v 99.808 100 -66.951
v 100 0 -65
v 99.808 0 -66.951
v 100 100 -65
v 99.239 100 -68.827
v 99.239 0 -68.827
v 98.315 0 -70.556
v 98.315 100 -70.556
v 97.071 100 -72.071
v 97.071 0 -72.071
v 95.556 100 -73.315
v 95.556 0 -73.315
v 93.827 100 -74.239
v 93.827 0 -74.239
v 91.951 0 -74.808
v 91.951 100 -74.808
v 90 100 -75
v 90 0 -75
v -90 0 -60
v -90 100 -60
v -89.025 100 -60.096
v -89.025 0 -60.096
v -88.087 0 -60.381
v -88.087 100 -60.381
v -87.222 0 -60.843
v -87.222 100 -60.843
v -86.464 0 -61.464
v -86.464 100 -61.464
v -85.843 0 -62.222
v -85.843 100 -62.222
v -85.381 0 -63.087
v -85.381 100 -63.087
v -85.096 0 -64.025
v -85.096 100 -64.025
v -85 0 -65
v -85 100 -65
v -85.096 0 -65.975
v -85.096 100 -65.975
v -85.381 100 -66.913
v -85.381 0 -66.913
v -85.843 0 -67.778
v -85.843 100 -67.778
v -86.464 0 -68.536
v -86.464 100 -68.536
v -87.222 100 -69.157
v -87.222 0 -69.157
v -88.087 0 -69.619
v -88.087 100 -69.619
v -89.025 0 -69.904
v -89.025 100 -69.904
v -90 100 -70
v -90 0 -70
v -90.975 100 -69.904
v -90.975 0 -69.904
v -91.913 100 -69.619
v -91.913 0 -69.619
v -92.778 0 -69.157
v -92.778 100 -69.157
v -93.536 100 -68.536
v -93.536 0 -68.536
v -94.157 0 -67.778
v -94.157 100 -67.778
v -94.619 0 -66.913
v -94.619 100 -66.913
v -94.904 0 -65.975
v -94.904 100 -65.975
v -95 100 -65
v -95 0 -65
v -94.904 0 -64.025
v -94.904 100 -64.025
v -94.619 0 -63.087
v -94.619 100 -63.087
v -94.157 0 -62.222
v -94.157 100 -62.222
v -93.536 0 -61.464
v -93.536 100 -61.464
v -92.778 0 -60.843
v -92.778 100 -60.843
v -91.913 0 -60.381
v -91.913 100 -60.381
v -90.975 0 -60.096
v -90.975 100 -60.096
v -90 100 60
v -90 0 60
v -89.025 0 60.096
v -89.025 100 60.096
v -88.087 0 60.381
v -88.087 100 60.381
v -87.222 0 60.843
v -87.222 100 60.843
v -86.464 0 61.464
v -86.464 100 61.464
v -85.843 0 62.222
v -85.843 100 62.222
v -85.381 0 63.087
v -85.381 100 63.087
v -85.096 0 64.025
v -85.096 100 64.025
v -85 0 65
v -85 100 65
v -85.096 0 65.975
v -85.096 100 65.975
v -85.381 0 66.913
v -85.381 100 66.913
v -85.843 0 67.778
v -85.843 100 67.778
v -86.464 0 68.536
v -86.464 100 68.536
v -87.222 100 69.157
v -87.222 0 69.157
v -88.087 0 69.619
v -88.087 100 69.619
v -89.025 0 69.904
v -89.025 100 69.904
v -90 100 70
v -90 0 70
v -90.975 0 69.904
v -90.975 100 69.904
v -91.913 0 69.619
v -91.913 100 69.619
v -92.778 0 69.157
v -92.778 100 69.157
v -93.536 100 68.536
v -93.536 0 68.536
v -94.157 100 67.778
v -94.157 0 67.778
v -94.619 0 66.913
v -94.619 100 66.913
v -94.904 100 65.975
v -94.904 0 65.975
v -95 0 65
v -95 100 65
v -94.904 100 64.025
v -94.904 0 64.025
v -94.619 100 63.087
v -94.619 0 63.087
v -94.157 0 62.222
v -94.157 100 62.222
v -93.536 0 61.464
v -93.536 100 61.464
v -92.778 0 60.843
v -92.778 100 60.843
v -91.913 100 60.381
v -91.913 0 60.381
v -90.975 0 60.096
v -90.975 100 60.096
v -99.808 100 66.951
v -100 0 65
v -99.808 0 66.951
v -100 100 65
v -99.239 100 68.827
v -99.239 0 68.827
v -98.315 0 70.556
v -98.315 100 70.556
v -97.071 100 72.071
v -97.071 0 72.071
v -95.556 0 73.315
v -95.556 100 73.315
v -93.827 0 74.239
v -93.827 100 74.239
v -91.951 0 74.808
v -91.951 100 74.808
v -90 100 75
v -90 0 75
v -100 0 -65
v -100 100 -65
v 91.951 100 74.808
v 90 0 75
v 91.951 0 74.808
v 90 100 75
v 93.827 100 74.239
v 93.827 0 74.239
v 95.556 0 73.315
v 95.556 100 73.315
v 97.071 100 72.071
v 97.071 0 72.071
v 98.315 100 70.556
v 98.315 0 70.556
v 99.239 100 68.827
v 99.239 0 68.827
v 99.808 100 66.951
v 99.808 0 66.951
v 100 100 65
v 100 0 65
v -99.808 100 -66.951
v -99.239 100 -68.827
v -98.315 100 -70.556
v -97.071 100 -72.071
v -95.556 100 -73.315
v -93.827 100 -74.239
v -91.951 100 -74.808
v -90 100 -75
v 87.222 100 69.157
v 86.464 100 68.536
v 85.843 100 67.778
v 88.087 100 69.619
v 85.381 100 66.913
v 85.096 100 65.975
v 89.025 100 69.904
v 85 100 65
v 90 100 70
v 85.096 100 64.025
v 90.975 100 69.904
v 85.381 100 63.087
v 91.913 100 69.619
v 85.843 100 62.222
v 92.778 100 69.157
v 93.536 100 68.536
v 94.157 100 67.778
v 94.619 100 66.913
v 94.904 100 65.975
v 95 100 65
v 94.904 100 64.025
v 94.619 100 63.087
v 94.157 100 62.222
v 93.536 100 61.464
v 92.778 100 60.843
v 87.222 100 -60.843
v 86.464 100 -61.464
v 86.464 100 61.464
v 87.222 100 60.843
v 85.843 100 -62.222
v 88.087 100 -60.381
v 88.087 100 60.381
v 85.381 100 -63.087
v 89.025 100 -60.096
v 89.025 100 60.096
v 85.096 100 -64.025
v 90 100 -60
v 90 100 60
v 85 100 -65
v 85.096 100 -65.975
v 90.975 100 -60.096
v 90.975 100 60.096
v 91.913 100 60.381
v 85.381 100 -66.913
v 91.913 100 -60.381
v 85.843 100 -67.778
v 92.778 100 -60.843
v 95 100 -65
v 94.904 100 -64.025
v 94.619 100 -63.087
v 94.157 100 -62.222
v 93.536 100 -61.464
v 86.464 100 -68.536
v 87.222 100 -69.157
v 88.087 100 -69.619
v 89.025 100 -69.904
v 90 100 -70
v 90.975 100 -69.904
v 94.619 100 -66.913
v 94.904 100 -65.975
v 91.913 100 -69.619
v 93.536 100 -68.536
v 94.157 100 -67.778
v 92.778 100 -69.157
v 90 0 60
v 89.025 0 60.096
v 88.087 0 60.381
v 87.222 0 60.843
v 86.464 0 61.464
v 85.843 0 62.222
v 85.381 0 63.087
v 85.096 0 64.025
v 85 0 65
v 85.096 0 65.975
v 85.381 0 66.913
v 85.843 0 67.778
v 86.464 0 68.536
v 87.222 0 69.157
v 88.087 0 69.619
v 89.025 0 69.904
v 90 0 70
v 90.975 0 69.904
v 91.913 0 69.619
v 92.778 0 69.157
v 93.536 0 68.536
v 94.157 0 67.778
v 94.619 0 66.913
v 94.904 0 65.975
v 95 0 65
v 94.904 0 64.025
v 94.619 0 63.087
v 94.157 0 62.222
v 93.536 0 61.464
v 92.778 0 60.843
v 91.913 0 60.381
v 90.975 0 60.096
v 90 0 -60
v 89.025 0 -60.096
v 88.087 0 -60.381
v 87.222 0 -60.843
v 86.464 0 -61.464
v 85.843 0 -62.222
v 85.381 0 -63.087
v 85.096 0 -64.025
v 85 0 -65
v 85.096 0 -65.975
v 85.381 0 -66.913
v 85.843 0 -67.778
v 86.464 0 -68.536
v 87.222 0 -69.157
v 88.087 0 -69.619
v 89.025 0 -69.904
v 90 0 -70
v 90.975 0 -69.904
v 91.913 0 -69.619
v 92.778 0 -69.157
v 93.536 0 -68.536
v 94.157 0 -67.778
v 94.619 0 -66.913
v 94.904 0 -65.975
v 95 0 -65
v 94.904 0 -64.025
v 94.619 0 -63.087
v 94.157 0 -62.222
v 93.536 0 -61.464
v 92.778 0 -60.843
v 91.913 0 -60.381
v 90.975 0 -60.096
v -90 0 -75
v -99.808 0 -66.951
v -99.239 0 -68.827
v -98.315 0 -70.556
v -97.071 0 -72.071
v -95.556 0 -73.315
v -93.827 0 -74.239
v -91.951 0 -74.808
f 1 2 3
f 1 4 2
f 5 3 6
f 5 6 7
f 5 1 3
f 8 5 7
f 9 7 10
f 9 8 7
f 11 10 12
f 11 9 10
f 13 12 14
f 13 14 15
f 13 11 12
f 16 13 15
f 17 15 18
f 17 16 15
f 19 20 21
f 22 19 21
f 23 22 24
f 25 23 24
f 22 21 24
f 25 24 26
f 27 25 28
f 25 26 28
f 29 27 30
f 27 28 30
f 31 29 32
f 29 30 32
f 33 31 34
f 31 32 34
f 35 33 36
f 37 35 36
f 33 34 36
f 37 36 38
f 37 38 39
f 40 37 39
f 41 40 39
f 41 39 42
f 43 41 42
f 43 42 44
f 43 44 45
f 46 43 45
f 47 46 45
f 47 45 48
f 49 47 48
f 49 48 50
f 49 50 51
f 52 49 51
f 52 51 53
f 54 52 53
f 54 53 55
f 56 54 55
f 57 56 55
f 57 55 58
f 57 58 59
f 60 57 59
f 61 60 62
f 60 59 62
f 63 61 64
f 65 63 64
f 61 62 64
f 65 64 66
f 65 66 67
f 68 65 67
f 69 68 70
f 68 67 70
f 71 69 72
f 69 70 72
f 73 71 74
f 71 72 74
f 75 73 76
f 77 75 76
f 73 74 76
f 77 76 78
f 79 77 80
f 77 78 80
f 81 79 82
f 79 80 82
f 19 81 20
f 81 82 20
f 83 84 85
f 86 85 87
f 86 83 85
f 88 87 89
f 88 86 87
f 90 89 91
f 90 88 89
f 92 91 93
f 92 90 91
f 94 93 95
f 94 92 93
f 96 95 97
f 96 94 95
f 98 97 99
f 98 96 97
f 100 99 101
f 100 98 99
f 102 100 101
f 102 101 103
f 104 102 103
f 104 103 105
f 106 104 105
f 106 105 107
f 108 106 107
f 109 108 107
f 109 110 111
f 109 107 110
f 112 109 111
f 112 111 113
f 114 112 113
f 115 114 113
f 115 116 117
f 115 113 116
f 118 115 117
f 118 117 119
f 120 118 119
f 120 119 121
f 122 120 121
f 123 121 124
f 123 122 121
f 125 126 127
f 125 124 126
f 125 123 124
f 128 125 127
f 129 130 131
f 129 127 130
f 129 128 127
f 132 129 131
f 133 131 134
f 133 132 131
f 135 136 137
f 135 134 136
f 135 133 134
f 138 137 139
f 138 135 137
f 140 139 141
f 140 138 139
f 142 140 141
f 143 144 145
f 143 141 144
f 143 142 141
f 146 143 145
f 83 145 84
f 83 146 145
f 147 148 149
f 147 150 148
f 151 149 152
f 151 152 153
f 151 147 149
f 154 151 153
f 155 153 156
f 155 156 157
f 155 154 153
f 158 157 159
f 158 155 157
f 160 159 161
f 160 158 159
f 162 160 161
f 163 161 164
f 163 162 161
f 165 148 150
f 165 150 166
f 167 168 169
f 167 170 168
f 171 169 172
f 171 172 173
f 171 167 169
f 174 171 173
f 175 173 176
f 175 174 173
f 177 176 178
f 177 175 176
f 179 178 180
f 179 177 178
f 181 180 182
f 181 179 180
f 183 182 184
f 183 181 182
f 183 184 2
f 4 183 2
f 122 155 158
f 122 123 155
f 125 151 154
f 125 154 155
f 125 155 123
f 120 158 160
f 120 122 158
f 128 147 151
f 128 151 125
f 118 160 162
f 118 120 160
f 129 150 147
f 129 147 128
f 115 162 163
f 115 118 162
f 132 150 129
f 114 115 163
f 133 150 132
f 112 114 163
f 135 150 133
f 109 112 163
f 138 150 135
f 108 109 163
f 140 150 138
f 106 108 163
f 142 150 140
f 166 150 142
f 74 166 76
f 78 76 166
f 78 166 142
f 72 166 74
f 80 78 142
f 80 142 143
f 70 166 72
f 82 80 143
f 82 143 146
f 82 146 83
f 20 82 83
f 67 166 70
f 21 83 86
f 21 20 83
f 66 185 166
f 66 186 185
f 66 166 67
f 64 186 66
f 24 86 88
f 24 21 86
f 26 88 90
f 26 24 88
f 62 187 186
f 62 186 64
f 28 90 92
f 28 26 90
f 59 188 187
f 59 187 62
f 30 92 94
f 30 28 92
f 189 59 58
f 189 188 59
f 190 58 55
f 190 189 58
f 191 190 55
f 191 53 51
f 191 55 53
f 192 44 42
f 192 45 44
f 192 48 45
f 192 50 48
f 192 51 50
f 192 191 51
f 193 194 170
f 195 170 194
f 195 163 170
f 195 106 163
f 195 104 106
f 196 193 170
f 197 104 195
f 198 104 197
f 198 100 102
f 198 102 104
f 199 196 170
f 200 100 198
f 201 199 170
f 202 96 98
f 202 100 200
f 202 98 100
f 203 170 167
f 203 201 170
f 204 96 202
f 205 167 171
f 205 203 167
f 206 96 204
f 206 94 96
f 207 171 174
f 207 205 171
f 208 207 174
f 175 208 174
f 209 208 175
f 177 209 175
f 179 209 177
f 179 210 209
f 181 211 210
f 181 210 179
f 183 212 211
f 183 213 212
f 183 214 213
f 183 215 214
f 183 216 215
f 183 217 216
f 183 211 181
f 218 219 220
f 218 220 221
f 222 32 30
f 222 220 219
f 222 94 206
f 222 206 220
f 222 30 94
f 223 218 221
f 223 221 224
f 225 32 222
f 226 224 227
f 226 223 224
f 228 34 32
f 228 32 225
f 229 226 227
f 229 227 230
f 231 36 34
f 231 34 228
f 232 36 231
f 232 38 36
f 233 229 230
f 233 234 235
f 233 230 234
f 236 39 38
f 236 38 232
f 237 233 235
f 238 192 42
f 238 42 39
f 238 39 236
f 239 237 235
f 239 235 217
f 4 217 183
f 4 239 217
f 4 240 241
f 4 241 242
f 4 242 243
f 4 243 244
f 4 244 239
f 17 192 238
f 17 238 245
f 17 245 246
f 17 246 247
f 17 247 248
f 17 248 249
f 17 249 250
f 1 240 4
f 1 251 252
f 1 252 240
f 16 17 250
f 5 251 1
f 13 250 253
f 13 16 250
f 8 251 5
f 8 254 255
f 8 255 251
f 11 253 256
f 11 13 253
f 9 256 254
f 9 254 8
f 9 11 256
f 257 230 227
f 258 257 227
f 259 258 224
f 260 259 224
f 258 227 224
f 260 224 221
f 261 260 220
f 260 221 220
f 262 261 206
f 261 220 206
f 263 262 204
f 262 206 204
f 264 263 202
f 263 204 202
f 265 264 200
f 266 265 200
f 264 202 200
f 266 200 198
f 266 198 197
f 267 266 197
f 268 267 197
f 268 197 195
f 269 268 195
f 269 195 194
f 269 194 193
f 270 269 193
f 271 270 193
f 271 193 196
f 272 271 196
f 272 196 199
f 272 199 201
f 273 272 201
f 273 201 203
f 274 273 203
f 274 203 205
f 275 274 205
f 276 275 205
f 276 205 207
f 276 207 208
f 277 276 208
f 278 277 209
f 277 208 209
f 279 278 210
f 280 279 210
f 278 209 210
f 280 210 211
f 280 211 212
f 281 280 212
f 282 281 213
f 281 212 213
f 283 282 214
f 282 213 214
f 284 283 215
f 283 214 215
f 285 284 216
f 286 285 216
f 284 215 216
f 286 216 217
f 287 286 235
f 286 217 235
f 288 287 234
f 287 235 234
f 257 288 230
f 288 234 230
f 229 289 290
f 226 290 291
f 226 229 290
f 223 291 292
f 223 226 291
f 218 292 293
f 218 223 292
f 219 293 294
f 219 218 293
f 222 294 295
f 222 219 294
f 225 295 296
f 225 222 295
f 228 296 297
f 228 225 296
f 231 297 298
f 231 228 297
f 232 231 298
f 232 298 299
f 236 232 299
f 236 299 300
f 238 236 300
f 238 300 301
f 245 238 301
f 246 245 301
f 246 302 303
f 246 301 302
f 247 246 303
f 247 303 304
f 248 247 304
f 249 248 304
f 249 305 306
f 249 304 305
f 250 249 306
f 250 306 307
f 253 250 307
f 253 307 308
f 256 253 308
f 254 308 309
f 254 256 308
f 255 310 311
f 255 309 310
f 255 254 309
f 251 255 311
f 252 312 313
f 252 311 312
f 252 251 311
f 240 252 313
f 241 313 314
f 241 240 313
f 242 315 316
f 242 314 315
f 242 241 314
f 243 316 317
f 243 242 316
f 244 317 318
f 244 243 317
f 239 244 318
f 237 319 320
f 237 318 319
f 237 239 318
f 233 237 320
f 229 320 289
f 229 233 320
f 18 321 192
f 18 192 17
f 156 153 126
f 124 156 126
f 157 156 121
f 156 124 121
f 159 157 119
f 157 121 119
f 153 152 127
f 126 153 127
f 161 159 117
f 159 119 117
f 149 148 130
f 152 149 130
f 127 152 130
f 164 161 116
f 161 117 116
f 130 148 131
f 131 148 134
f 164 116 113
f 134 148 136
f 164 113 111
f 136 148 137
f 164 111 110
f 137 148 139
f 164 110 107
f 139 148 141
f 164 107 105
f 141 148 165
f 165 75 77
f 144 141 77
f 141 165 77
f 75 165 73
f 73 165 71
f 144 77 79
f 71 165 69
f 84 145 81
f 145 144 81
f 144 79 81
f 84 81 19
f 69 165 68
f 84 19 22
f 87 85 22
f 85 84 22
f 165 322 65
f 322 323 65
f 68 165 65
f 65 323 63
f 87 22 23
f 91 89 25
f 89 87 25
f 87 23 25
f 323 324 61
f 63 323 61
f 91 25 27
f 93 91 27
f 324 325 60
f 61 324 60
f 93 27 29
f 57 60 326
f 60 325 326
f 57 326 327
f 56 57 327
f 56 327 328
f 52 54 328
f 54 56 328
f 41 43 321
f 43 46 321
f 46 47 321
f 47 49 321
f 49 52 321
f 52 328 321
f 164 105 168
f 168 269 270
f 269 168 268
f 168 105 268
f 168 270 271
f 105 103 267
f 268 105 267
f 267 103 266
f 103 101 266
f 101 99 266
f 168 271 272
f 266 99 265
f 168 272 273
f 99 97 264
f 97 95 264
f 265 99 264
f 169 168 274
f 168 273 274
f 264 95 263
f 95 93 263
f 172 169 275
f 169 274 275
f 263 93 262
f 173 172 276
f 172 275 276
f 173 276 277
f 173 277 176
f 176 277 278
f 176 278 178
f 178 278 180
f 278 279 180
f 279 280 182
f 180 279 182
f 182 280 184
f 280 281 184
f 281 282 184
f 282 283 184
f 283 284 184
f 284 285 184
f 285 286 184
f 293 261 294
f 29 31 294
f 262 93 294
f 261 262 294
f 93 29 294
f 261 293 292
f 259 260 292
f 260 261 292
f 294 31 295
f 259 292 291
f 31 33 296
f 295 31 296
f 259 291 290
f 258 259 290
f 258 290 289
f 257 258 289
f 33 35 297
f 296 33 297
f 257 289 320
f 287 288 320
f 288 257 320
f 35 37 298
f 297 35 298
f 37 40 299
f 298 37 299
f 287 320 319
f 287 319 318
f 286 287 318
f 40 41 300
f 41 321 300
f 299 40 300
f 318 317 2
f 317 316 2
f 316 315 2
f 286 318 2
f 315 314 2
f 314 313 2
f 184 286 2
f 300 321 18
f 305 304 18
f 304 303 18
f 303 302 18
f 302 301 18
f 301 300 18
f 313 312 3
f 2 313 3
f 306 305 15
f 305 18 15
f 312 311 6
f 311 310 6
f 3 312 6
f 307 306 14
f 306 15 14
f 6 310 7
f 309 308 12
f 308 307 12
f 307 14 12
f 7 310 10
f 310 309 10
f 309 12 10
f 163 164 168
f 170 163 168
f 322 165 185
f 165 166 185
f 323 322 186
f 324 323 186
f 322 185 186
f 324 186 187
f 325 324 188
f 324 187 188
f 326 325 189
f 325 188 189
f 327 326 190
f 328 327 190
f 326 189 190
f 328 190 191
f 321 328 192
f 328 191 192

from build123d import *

# Parameters (mm, degrees)
CROQUIS1_W                                 = 200
CROQUIS1_H                                 = 150
SALIENTE_EXTRUIR1_DEPTH                    = 100
REDONDEO1_R                                = 10
CROQUIS2_R                                 = 5
CORTAR_EXTRUIR1_DEPTH                      = 161.078105936
SIMETR_A1_AT_THE_SECOND_PLANE_COPY_1_SKE_R = 5
SIMETR_A1_AT_THE_SECOND_PLANE_COPY_1_DEPTH = 161.078105936


with BuildPart() as part:
    # Croquis1 → Saliente-Extruir1 (new body)
    with BuildSketch(Plane(origin=(0, 0, 0), x_dir=(1, 0, 0), z_dir=(0, 1, 0))):
        Rectangle(CROQUIS1_W, CROQUIS1_H)
    extrude(amount=SALIENTE_EXTRUIR1_DEPTH)

    # Redondeo1
    redondeo1_edges = [part.edges().sort_by_distance(p)[0] for p in [
        (-100, 50, -75),
        (100, 50, -75),
        (100, 50, 75),
        (-100, 50, 75),
    ]]
    fillet(redondeo1_edges, radius=REDONDEO1_R)

    # Croquis2 → Cortar-Extruir1 (cut, through all)
    with BuildSketch(Plane(origin=(0, 100, 0), x_dir=(1, 0, 0), z_dir=(0, 1, 0))):
        with Locations(Location((-90, 65, 0), (0, 0, 270))):
            Circle(CROQUIS2_R)
    cortar_extruir1 = extrude(amount=-CORTAR_EXTRUIR1_DEPTH, mode=Mode.SUBTRACT)

    # Simetría1: Cortar-Extruir1 across plane
    add(cortar_extruir1.mirror(Plane.XY), mode=Mode.SUBTRACT)

    # Simetría1 at the second plane: Cortar-Extruir1 across plane
    add(cortar_extruir1.mirror(Plane(origin=(0, 0, 0), x_dir=(0, 0, 1), z_dir=(1, 0, 0))), mode=Mode.SUBTRACT)

    # Simetría1 at the second plane copy 1 ske → Simetría1 at the second plane copy 1 (cut, through all)
    with BuildSketch(Plane(origin=(0, 100, 0), x_dir=(-1, 0, 0), z_dir=(0, 1, 0))):
        with Locations(Location((-90, 65, 0), (0, 0, 270))):
            Circle(SIMETR_A1_AT_THE_SECOND_PLANE_COPY_1_SKE_R)
    extrude(amount=-SIMETR_A1_AT_THE_SECOND_PLANE_COPY_1_DEPTH, mode=Mode.SUBTRACT)


solid = part.part
